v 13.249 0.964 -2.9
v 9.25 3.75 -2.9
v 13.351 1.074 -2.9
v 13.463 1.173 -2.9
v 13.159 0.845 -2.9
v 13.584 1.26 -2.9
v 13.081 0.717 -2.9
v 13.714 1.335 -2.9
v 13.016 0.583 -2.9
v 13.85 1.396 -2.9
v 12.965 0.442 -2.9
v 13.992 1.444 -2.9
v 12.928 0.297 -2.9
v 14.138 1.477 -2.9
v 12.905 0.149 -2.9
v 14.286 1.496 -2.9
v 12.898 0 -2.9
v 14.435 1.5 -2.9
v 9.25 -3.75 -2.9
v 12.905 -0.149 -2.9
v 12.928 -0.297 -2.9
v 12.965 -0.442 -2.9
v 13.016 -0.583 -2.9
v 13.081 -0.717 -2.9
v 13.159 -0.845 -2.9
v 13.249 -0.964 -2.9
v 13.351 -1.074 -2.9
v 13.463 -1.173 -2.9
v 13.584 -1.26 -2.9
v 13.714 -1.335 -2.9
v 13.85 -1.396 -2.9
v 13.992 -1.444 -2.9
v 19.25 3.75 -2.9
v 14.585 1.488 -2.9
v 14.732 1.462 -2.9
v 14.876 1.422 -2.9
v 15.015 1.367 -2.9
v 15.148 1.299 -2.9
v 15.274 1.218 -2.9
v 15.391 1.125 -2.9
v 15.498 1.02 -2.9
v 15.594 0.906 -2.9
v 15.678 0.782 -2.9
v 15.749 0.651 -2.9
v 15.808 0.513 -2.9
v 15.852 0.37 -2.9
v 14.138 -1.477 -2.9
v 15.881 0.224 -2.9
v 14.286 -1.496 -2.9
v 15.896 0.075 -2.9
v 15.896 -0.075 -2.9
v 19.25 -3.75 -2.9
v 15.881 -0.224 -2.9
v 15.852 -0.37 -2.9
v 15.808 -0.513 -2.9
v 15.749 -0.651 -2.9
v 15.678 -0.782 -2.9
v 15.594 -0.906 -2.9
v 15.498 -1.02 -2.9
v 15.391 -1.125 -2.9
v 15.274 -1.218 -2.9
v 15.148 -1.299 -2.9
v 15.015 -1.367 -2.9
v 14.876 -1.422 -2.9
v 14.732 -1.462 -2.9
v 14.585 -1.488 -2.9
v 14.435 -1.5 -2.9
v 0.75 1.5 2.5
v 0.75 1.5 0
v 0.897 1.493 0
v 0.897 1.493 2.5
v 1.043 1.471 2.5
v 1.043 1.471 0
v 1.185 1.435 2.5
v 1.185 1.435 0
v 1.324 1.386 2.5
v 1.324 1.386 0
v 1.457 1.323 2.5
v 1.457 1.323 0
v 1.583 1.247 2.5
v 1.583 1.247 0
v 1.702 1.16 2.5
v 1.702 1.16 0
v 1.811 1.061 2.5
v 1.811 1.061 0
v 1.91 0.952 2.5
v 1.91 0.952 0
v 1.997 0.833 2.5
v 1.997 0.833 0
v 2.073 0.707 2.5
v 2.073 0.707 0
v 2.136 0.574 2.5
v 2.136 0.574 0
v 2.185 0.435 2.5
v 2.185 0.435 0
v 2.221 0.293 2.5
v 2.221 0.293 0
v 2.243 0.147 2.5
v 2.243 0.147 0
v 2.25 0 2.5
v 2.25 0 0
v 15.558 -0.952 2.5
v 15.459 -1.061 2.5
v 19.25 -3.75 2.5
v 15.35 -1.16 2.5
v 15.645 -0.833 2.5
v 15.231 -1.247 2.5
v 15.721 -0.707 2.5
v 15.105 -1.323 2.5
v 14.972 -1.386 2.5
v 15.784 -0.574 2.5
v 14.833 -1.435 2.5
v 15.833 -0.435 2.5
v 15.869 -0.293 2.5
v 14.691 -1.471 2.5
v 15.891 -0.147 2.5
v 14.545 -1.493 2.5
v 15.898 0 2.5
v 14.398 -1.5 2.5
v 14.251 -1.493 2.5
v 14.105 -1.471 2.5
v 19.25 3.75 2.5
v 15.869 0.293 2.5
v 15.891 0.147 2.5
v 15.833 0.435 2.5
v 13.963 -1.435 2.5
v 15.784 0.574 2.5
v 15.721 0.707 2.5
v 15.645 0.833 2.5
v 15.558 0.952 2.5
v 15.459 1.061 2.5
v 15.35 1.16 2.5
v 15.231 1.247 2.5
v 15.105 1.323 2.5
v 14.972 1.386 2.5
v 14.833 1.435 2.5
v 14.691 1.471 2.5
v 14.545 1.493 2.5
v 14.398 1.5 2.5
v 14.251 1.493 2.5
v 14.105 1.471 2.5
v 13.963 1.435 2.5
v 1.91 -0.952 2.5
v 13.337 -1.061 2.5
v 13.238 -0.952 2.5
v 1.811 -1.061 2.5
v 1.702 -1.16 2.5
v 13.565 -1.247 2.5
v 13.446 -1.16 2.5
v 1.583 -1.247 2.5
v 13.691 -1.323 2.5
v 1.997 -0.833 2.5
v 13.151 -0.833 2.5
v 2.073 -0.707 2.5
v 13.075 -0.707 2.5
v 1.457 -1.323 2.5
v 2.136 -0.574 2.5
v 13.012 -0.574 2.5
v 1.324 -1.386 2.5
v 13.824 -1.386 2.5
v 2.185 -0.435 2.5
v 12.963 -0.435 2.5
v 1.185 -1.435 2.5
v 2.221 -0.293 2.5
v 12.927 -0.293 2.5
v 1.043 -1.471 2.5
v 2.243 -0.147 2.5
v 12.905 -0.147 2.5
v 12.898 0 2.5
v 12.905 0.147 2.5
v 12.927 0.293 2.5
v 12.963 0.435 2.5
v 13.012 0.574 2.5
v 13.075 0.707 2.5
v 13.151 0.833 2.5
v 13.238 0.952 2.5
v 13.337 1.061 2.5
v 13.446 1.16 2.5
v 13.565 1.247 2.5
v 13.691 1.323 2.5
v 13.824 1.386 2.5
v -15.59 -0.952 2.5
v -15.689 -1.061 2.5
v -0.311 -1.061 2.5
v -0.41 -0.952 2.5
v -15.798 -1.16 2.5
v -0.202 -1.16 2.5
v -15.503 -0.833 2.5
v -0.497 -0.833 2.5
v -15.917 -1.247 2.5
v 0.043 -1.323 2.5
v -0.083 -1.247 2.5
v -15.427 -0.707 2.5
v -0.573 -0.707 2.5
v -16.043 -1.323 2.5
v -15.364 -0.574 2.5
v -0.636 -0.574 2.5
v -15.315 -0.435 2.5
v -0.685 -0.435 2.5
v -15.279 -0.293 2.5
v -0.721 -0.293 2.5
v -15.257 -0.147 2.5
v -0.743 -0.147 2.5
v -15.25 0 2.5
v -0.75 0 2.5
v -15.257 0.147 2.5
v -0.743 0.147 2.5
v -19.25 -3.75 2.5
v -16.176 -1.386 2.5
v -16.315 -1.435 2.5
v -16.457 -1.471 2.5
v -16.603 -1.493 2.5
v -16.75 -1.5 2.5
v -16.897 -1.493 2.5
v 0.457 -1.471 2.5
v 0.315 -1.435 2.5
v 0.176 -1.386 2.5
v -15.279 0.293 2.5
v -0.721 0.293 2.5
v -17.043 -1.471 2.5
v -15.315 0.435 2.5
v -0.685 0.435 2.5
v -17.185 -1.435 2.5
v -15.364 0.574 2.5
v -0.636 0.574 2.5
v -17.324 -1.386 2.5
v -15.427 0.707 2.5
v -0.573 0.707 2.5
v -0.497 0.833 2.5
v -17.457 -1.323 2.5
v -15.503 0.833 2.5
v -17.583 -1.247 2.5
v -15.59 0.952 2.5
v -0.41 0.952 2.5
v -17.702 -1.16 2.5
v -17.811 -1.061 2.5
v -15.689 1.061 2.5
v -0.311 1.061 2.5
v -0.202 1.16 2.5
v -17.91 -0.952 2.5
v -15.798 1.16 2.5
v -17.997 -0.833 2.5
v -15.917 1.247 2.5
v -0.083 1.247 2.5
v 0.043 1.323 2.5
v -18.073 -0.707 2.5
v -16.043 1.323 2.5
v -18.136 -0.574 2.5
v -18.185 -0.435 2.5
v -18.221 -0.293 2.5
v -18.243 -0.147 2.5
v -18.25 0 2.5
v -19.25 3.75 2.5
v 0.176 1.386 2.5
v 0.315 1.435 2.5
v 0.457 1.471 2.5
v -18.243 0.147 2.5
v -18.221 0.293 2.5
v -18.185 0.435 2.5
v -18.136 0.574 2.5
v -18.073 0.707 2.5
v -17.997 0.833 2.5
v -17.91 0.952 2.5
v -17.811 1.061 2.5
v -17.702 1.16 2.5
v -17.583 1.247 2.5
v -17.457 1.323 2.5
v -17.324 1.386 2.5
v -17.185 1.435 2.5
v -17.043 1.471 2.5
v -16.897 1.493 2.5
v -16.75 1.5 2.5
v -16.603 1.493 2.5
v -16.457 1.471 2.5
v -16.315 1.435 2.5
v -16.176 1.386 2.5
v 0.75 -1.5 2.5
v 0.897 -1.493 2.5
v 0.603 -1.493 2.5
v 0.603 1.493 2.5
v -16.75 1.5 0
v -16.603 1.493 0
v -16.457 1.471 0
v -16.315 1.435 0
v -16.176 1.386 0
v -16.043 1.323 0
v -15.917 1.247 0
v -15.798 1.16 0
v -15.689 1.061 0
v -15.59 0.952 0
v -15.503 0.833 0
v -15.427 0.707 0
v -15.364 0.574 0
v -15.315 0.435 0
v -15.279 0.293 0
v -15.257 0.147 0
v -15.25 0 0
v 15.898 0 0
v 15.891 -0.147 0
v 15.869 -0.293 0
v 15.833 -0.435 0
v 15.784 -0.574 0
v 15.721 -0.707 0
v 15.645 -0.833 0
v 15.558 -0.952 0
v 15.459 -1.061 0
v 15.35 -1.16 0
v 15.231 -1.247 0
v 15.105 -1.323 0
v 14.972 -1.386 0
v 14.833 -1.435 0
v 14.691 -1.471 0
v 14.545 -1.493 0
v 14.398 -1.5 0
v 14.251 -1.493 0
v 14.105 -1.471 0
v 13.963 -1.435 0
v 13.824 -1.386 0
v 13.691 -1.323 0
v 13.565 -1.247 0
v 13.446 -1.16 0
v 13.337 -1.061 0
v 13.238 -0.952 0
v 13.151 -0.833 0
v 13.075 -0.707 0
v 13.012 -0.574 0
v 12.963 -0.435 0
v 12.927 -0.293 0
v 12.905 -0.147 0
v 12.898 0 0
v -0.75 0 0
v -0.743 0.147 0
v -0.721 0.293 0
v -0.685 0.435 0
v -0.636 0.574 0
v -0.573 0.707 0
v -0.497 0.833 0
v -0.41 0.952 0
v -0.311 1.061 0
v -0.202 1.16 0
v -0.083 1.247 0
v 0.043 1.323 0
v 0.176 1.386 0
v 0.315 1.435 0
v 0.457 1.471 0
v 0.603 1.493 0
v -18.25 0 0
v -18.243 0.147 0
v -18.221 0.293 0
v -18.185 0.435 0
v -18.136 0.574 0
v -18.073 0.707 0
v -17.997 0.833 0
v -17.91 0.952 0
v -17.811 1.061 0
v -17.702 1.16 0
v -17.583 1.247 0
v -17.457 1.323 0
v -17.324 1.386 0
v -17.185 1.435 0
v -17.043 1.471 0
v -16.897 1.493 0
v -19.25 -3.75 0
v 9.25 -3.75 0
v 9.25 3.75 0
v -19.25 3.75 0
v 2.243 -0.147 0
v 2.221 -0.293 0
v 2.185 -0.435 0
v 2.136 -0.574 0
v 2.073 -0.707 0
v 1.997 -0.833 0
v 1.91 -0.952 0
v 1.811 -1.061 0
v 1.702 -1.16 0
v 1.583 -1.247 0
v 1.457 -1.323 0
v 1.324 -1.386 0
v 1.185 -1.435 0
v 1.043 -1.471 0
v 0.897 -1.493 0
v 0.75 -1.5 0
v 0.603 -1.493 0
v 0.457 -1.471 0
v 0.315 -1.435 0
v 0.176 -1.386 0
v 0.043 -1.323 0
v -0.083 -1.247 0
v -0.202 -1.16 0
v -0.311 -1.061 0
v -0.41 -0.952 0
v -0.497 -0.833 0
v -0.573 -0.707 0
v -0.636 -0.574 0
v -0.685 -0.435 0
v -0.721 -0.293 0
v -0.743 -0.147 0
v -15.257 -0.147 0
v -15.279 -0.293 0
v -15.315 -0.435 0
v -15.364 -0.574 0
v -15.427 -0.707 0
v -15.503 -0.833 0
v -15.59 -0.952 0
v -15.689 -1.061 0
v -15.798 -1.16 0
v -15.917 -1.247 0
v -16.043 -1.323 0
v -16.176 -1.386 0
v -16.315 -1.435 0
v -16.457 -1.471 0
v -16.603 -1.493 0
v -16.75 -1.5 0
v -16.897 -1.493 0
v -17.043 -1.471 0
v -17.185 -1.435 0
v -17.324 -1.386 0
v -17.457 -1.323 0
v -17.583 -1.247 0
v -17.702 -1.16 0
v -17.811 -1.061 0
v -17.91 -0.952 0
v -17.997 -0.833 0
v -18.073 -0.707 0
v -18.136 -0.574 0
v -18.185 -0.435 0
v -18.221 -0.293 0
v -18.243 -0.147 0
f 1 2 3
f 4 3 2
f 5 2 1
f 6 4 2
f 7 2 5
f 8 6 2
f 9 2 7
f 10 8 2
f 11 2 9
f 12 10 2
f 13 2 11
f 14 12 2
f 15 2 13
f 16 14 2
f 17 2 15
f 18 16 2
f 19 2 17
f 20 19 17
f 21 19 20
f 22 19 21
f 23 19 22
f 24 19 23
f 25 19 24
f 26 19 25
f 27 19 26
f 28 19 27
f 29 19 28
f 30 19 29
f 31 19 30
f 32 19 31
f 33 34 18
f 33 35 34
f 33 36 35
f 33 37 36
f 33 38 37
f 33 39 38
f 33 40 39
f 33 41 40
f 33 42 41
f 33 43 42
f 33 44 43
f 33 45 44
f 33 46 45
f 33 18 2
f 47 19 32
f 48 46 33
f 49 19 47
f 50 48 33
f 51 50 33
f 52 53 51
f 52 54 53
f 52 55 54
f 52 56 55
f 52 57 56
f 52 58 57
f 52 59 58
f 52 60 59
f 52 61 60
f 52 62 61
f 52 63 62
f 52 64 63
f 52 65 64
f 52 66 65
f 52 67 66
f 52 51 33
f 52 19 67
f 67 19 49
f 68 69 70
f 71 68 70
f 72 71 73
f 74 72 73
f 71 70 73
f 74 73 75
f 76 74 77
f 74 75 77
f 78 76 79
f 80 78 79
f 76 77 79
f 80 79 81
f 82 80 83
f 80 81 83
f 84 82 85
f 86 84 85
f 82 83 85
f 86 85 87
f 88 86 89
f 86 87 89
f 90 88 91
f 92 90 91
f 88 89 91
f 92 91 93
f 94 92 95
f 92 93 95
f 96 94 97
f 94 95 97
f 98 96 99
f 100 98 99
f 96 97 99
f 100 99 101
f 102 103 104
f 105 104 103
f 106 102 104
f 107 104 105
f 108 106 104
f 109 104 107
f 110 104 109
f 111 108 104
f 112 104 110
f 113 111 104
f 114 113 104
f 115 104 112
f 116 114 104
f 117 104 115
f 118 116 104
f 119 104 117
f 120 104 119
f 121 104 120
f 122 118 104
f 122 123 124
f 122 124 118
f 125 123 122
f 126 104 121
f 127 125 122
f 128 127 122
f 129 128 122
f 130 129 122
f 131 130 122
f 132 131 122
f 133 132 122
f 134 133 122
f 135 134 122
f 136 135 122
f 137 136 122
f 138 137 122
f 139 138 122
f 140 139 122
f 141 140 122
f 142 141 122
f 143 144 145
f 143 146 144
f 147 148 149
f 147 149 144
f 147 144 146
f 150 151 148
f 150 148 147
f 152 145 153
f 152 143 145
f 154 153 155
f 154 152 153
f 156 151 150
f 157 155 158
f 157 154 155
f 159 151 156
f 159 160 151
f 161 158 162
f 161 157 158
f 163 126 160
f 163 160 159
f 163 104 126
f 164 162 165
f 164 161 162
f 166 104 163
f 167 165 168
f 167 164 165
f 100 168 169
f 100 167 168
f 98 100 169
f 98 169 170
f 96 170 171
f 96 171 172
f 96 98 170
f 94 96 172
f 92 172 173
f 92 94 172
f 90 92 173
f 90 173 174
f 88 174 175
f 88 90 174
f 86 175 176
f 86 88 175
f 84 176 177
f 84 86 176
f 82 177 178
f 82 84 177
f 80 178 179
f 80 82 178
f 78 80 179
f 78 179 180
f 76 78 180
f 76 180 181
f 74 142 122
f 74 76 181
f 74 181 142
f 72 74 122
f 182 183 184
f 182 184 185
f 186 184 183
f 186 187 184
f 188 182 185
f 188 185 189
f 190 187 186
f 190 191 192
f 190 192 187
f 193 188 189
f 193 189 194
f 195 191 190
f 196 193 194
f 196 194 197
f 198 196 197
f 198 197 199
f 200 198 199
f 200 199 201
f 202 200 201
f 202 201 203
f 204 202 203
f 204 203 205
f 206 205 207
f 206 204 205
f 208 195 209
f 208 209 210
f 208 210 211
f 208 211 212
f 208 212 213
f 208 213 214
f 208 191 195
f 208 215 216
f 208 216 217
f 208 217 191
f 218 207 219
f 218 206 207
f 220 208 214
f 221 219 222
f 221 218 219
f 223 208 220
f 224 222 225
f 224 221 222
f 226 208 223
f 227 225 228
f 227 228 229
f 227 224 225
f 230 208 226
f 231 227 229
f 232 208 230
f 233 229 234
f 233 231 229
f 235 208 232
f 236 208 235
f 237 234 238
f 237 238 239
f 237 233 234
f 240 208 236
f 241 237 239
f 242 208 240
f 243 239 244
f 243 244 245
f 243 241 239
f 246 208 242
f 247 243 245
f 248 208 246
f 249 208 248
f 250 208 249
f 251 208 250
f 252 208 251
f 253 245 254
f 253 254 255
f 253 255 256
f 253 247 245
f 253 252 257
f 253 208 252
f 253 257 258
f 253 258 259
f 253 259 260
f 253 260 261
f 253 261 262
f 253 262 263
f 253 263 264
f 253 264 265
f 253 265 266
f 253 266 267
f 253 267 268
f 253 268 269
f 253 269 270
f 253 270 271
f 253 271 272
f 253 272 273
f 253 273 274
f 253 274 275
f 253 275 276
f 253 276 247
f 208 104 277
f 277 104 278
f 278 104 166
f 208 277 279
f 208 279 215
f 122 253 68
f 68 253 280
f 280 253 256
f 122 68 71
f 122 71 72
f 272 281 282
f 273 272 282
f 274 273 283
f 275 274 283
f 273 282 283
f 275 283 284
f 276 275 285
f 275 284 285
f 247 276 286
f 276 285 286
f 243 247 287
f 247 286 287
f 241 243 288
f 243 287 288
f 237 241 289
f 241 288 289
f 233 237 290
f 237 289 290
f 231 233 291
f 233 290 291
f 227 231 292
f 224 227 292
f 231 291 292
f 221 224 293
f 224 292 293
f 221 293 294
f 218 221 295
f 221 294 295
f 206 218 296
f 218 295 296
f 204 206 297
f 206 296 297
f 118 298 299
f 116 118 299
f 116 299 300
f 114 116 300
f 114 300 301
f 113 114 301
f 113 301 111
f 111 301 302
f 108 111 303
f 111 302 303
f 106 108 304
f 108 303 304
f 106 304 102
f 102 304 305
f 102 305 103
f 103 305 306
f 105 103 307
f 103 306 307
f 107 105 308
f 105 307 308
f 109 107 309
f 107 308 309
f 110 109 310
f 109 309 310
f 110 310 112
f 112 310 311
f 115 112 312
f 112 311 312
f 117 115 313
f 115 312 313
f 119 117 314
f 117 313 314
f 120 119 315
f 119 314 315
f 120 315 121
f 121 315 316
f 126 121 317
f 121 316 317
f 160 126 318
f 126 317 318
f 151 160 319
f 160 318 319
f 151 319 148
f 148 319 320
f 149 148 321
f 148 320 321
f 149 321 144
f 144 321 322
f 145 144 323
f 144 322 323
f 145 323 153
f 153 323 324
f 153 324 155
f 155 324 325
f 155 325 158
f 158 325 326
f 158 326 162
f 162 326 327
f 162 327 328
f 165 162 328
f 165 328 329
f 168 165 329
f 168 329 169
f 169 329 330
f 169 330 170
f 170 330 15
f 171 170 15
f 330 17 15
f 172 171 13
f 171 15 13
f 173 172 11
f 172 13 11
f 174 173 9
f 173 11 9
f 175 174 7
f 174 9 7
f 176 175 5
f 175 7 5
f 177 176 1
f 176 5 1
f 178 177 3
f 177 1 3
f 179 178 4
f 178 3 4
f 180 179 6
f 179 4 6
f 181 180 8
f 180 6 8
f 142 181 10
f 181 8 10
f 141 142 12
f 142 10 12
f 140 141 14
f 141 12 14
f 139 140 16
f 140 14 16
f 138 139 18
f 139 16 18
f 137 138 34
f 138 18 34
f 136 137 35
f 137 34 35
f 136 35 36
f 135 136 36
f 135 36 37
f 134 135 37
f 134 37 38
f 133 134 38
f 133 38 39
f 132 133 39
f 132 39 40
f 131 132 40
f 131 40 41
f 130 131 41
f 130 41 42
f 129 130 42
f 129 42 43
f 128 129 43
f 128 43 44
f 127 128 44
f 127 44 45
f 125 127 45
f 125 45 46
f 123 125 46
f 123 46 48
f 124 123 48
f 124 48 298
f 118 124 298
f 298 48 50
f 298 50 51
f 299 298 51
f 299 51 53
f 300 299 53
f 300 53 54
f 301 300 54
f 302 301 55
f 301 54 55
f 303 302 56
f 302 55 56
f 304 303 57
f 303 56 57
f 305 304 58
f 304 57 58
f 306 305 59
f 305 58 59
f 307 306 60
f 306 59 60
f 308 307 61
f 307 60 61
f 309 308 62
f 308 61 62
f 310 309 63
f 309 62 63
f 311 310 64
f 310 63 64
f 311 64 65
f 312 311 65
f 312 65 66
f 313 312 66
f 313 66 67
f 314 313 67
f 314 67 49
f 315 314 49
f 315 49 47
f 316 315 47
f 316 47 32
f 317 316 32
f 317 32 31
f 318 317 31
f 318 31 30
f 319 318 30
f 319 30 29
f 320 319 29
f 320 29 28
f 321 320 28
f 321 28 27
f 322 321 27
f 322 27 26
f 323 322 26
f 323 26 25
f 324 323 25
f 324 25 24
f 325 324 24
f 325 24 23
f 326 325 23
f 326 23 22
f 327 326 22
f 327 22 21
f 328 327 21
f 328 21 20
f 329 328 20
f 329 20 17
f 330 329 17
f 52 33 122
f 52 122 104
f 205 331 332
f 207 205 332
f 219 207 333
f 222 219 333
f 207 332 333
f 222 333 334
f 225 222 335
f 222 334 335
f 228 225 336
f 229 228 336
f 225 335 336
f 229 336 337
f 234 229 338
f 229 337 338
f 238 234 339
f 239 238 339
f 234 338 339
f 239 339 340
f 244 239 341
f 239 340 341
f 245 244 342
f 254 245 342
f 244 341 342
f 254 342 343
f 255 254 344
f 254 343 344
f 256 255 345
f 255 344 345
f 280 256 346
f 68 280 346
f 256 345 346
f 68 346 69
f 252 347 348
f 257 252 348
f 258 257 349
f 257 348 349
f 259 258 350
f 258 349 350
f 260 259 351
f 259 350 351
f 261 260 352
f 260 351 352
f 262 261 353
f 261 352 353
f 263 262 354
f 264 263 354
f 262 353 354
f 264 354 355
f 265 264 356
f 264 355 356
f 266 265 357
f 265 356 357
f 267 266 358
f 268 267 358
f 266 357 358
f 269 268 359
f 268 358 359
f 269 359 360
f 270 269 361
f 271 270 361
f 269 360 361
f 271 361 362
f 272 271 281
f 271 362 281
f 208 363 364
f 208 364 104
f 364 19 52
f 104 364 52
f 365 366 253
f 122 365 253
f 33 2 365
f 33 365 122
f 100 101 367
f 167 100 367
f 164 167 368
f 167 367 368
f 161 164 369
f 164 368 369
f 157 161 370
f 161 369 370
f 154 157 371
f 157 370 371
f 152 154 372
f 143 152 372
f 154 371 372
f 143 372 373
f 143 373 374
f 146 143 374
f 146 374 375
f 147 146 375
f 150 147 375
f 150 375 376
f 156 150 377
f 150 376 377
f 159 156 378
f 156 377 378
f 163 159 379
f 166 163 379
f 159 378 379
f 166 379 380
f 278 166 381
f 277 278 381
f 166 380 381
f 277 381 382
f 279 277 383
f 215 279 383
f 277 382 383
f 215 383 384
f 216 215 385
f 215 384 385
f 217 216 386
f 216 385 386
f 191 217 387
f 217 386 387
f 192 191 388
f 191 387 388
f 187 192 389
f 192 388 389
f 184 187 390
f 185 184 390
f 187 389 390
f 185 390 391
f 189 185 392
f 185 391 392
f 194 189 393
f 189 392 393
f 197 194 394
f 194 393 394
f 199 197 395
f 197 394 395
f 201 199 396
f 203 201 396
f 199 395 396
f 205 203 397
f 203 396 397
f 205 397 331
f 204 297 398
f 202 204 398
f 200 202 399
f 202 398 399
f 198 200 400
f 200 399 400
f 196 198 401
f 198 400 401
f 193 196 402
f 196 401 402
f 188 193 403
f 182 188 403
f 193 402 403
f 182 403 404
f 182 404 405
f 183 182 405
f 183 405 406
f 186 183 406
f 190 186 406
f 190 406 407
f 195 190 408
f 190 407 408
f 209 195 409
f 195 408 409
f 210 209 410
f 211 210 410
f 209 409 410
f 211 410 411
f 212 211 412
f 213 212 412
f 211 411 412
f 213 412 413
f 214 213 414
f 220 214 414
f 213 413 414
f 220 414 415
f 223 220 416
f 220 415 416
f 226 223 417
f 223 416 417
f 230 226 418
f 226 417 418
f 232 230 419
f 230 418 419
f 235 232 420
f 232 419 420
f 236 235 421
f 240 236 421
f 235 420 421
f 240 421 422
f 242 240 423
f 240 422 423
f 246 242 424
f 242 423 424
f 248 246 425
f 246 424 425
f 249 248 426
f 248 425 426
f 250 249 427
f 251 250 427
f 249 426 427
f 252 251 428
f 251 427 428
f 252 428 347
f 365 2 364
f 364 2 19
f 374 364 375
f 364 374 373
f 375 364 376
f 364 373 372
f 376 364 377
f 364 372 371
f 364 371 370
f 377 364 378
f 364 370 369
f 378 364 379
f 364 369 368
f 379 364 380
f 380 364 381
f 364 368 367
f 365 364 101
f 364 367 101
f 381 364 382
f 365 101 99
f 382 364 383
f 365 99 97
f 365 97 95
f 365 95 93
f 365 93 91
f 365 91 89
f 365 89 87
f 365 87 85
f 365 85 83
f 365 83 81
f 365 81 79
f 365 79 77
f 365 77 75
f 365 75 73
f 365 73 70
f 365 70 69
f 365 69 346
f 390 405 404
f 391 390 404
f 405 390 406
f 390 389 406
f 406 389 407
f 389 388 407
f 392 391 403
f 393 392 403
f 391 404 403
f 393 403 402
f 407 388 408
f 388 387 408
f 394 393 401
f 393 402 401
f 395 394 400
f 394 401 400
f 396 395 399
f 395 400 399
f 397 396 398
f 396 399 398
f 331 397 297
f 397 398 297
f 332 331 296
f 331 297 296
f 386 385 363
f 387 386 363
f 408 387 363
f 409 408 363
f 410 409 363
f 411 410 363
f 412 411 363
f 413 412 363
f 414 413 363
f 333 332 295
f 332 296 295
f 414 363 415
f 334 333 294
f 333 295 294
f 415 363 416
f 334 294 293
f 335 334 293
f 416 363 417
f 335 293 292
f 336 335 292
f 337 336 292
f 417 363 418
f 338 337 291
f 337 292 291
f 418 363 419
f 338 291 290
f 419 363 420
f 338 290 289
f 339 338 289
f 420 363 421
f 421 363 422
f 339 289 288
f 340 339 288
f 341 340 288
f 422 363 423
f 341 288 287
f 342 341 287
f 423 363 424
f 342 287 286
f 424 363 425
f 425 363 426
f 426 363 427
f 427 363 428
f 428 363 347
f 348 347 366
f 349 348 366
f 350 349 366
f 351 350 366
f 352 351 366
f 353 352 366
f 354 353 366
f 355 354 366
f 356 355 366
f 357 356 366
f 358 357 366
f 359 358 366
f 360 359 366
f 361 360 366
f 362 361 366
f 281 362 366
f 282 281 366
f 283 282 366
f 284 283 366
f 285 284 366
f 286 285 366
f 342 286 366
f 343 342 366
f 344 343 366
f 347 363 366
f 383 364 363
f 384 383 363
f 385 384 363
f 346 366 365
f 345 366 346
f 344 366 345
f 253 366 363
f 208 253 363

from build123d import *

# Parameters (mm, degrees)
BOSS_EXTRUDE1_DEPTH = 2.5
BOSS_EXTRUDE2_START = 2.9
SKETCH2_W           = 10
SKETCH2_H           = 7.5
SKETCH2_R           = 1.5
BOSS_EXTRUDE2_DEPTH = 2.9


with BuildPart() as part:
    # Sketch1 → Boss-Extrude1 (new body)
    with BuildSketch(Plane(origin=(0, 0, 0), x_dir=(0, 1, 0), z_dir=(0, 0, 1))):
        with BuildLine():
            Line((0, 18.25), (0, 19.25))
            Line((0, 19.25), (-3.75, 19.25))
            Line((-3.75, 19.25), (-3.75, -19.25))
            Line((-3.75, -19.25), (0, -19.25))
            Line((0, -19.25), (0, -15.898))
            ThreePointArc((0, -15.898), (-1.5, -14.398), (0, -12.898))
            Line((0, -12.898), (0, -2.25))
            ThreePointArc((0, -2.25), (-1.5, -0.75), (0, 0.75))
            Line((0, 0.75), (0, 15.25))
            ThreePointArc((0, 15.25), (-1.5, 16.75), (0, 18.25))
        make_face()
        with BuildLine():
            Line((3.75, 19.25), (0, 19.25))
            Line((0, 19.25), (0, 18.25))
            ThreePointArc((0, 18.25), (1.060660172, 17.810660172), (1.5, 16.75))
            ThreePointArc((1.5, 16.75), (1.060660172, 15.689339828), (0, 15.25))
            Line((0, 15.25), (0, 0.75))
            ThreePointArc((0, 0.75), (1.060660172, 0.310660172), (1.5, -0.75))
            ThreePointArc((1.5, -0.75), (1.060660172, -1.810660172), (0, -2.25))
            Line((0, -2.25), (0, -12.898))
            ThreePointArc((0, -12.898), (1.060660172, -13.337339828), (1.5, -14.398))
            ThreePointArc((1.5, -14.398), (1.060660172, -15.458660172), (0, -15.898))
            Line((0, -15.898), (0, -19.25))
            Line((0, -19.25), (3.75, -19.25))
            Line((3.75, -19.25), (3.75, 19.25))
        make_face()
    extrude(amount=BOSS_EXTRUDE1_DEPTH)

    # Sketch2 → Boss-Extrude2 (add)
    with BuildSketch(Plane(origin=(0, 0, 0), x_dir=(1, 0, 0), z_dir=(0, 0, -1)).offset(BOSS_EXTRUDE2_START)):
        with Locations((14.25, 0)):
            Rectangle(SKETCH2_W, SKETCH2_H)
        with Locations(Location((14.398, 0, 0), (0, 0, 180))):
            Circle(SKETCH2_R, mode=Mode.SUBTRACT)
    extrude(amount=-BOSS_EXTRUDE2_DEPTH)


solid = part.part
